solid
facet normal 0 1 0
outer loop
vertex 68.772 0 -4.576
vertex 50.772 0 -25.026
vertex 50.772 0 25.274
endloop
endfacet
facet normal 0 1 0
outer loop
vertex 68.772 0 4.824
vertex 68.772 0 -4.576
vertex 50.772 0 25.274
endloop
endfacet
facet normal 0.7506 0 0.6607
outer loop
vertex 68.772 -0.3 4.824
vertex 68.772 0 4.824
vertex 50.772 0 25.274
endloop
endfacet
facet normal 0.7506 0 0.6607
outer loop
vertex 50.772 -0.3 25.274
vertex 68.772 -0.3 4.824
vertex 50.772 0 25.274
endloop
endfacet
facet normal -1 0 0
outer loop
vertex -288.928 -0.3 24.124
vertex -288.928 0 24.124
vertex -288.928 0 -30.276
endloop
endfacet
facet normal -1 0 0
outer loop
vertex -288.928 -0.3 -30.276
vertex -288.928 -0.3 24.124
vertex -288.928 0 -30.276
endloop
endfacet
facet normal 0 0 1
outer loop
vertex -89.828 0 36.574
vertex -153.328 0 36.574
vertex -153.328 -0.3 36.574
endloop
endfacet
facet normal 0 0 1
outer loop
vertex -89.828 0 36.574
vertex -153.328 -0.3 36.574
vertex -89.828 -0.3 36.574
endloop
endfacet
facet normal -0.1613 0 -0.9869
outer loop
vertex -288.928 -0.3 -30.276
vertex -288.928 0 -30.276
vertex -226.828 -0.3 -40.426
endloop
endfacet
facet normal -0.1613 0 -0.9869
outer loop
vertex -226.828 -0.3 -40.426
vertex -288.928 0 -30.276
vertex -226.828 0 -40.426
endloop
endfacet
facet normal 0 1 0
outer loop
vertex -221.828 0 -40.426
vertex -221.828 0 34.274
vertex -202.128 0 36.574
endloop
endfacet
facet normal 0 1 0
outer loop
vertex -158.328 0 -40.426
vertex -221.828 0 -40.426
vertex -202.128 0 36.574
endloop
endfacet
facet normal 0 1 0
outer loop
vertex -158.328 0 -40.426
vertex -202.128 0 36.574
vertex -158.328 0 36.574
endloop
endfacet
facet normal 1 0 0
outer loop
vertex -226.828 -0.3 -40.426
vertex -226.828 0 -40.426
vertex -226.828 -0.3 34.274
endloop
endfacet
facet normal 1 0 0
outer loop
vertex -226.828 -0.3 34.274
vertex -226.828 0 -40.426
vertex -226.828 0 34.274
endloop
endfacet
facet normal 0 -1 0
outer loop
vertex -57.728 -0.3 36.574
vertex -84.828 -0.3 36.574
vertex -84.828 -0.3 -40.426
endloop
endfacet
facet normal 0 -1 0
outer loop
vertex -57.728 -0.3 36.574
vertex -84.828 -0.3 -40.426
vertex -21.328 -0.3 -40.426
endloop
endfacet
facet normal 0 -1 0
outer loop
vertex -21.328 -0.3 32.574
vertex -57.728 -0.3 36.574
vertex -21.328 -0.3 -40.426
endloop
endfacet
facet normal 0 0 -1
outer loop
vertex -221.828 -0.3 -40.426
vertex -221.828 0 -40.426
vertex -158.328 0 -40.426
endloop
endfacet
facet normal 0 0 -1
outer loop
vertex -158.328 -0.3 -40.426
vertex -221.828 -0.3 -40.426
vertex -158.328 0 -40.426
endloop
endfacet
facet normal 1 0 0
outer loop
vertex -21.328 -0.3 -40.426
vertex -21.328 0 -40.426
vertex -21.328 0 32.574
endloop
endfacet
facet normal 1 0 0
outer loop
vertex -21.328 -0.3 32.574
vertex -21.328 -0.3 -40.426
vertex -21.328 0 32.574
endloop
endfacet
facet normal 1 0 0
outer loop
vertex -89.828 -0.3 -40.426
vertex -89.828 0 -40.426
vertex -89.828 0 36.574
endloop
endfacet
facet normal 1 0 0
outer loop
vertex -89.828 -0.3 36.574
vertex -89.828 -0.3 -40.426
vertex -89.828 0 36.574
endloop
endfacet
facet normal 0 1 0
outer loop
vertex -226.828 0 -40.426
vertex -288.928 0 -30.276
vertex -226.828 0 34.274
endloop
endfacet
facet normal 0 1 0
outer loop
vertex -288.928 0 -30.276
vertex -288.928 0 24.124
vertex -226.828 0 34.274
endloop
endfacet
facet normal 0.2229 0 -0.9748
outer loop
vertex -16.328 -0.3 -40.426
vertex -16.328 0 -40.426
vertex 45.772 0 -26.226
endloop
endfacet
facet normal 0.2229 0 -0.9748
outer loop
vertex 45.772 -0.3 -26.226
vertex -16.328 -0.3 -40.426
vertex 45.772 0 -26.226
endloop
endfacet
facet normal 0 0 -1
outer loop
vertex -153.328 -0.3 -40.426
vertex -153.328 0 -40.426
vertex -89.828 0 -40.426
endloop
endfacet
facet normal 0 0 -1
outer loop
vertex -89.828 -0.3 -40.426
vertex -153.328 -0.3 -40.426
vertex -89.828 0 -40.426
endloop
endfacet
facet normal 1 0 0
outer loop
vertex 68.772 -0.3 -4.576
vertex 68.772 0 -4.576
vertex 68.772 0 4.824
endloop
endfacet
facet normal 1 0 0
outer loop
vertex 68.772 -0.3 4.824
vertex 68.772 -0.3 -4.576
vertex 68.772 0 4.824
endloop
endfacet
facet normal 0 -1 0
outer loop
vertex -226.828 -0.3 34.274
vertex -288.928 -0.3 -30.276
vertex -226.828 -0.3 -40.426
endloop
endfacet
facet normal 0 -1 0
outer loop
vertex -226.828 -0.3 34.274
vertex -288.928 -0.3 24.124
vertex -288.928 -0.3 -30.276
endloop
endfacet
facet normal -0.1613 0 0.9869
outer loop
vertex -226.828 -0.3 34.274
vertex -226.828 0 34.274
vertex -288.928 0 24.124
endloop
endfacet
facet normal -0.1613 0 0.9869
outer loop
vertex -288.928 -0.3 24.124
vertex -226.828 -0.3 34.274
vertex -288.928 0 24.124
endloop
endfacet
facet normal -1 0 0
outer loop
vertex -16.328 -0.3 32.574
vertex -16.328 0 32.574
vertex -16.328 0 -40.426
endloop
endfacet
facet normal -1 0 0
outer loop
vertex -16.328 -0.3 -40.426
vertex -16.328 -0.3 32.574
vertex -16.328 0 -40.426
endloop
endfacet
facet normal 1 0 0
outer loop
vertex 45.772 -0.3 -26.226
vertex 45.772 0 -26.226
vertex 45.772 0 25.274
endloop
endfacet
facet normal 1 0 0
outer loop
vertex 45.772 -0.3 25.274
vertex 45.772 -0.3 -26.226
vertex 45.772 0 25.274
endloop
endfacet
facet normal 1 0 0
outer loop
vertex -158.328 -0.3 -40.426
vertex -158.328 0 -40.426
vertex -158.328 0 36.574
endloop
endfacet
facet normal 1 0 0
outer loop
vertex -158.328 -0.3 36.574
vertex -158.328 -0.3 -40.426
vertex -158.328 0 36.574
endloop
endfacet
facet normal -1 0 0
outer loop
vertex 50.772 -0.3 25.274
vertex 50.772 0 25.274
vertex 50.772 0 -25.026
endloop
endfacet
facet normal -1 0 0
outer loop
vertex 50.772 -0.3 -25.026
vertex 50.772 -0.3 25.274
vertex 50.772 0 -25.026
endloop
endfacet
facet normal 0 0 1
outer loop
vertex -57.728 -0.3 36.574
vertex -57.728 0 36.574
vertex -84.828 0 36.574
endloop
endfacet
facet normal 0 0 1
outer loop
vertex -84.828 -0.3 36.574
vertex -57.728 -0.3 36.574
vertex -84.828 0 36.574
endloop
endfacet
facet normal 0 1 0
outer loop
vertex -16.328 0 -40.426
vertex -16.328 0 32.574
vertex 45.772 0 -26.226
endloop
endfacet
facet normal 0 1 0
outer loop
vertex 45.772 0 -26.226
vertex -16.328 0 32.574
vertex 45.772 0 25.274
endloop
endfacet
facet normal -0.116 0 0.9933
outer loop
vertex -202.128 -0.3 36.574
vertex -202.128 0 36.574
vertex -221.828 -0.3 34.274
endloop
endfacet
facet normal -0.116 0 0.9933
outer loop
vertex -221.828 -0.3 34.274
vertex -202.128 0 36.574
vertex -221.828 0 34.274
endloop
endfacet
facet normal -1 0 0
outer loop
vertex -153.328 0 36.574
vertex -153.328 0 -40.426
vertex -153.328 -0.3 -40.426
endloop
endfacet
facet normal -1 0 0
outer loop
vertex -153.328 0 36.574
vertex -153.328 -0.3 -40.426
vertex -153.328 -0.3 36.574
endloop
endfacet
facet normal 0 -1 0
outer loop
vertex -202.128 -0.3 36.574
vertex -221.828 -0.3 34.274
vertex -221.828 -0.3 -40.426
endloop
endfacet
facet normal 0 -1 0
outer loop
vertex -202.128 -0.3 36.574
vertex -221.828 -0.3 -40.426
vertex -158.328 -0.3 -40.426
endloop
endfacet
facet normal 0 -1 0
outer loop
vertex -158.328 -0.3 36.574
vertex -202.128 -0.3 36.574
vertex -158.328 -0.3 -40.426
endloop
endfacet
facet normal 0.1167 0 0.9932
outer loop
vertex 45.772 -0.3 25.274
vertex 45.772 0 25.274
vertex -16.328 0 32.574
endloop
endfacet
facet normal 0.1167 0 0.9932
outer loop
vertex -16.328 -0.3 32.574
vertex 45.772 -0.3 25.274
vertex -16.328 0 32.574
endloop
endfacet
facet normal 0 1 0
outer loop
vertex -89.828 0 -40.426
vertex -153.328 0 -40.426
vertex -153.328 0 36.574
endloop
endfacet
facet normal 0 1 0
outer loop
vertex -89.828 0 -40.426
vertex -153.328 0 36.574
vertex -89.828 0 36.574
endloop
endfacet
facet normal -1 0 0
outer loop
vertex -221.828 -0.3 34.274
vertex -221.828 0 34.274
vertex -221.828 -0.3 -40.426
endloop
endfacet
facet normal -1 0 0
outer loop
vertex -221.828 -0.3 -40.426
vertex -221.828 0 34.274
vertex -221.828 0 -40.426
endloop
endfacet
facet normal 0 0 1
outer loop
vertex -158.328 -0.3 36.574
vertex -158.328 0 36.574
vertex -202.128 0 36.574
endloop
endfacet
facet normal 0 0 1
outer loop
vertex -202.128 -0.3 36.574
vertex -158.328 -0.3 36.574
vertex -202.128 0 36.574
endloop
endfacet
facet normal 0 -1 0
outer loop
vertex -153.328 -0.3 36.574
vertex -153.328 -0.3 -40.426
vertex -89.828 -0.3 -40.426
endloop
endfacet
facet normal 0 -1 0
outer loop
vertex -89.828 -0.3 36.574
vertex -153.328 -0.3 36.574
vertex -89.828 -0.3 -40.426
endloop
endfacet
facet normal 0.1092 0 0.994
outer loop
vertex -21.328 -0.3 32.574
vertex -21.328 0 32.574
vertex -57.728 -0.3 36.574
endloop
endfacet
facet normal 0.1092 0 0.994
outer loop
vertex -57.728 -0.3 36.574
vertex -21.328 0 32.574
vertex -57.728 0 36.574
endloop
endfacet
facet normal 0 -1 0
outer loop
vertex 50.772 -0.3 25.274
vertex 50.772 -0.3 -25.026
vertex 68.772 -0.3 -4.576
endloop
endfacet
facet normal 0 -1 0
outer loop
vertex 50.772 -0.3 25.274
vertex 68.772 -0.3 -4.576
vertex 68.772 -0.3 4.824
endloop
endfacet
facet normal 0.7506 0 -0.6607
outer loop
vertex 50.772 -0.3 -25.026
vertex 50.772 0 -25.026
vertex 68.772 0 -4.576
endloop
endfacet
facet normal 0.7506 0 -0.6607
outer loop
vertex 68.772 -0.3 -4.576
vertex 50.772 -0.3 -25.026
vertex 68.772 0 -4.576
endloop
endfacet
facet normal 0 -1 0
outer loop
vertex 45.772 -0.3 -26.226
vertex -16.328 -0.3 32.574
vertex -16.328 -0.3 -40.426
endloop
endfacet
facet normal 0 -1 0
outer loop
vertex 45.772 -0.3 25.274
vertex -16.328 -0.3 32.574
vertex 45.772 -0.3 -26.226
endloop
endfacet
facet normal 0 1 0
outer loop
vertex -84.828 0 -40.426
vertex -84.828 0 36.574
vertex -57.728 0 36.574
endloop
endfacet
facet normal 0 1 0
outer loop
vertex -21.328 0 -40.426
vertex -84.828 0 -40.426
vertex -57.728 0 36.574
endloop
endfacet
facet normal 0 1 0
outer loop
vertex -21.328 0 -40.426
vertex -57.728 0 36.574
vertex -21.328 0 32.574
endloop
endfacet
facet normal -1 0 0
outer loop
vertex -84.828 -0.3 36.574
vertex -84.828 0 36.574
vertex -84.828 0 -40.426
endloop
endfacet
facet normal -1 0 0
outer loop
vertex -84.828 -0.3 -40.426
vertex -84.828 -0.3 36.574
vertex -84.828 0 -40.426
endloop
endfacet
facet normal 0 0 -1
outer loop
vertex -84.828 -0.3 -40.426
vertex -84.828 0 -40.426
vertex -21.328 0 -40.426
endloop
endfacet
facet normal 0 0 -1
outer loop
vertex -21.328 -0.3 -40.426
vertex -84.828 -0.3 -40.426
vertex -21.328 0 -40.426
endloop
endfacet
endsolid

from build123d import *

# Parameters (mm, degrees)
F0_W     = 63.5
F0_H     = 77
F1_DEPTH = 0.3


with BuildPart() as f1:
    # F0 (on Front) → F1 (new body)
    with BuildSketch(Plane.XZ):
        Polygon((45.77241, 25.274221), (-16.32759, 32.574221), (-16.32759, -40.425779), (45.77241, -26.225779), align=None)
        Polygon((50.77241, 25.274221), (50.77241, -25.025779), (68.77241, -4.575779), (68.77241, 4.824221), align=None)
        Polygon((-288.92759, -30.275779), (-226.82759, -40.425779), (-226.82759, 34.274221), (-288.92759, 24.124221), align=None)
        Polygon((-158.32759, -40.425779), (-158.32759, 36.574221), (-202.12759, 36.574221), (-221.82759, 34.274221), (-221.82759, -40.425779), align=None)
        with Locations((-121.57759, -1.925779)):
            Rectangle(F0_W, F0_H)
        Polygon((-21.32759, -40.425779), (-21.32759, 32.574221), (-57.72759, 36.574221), (-84.82759, 36.574221), (-84.82759, -40.425779), align=None)
    extrude(amount=F1_DEPTH)


solid = f1.part
